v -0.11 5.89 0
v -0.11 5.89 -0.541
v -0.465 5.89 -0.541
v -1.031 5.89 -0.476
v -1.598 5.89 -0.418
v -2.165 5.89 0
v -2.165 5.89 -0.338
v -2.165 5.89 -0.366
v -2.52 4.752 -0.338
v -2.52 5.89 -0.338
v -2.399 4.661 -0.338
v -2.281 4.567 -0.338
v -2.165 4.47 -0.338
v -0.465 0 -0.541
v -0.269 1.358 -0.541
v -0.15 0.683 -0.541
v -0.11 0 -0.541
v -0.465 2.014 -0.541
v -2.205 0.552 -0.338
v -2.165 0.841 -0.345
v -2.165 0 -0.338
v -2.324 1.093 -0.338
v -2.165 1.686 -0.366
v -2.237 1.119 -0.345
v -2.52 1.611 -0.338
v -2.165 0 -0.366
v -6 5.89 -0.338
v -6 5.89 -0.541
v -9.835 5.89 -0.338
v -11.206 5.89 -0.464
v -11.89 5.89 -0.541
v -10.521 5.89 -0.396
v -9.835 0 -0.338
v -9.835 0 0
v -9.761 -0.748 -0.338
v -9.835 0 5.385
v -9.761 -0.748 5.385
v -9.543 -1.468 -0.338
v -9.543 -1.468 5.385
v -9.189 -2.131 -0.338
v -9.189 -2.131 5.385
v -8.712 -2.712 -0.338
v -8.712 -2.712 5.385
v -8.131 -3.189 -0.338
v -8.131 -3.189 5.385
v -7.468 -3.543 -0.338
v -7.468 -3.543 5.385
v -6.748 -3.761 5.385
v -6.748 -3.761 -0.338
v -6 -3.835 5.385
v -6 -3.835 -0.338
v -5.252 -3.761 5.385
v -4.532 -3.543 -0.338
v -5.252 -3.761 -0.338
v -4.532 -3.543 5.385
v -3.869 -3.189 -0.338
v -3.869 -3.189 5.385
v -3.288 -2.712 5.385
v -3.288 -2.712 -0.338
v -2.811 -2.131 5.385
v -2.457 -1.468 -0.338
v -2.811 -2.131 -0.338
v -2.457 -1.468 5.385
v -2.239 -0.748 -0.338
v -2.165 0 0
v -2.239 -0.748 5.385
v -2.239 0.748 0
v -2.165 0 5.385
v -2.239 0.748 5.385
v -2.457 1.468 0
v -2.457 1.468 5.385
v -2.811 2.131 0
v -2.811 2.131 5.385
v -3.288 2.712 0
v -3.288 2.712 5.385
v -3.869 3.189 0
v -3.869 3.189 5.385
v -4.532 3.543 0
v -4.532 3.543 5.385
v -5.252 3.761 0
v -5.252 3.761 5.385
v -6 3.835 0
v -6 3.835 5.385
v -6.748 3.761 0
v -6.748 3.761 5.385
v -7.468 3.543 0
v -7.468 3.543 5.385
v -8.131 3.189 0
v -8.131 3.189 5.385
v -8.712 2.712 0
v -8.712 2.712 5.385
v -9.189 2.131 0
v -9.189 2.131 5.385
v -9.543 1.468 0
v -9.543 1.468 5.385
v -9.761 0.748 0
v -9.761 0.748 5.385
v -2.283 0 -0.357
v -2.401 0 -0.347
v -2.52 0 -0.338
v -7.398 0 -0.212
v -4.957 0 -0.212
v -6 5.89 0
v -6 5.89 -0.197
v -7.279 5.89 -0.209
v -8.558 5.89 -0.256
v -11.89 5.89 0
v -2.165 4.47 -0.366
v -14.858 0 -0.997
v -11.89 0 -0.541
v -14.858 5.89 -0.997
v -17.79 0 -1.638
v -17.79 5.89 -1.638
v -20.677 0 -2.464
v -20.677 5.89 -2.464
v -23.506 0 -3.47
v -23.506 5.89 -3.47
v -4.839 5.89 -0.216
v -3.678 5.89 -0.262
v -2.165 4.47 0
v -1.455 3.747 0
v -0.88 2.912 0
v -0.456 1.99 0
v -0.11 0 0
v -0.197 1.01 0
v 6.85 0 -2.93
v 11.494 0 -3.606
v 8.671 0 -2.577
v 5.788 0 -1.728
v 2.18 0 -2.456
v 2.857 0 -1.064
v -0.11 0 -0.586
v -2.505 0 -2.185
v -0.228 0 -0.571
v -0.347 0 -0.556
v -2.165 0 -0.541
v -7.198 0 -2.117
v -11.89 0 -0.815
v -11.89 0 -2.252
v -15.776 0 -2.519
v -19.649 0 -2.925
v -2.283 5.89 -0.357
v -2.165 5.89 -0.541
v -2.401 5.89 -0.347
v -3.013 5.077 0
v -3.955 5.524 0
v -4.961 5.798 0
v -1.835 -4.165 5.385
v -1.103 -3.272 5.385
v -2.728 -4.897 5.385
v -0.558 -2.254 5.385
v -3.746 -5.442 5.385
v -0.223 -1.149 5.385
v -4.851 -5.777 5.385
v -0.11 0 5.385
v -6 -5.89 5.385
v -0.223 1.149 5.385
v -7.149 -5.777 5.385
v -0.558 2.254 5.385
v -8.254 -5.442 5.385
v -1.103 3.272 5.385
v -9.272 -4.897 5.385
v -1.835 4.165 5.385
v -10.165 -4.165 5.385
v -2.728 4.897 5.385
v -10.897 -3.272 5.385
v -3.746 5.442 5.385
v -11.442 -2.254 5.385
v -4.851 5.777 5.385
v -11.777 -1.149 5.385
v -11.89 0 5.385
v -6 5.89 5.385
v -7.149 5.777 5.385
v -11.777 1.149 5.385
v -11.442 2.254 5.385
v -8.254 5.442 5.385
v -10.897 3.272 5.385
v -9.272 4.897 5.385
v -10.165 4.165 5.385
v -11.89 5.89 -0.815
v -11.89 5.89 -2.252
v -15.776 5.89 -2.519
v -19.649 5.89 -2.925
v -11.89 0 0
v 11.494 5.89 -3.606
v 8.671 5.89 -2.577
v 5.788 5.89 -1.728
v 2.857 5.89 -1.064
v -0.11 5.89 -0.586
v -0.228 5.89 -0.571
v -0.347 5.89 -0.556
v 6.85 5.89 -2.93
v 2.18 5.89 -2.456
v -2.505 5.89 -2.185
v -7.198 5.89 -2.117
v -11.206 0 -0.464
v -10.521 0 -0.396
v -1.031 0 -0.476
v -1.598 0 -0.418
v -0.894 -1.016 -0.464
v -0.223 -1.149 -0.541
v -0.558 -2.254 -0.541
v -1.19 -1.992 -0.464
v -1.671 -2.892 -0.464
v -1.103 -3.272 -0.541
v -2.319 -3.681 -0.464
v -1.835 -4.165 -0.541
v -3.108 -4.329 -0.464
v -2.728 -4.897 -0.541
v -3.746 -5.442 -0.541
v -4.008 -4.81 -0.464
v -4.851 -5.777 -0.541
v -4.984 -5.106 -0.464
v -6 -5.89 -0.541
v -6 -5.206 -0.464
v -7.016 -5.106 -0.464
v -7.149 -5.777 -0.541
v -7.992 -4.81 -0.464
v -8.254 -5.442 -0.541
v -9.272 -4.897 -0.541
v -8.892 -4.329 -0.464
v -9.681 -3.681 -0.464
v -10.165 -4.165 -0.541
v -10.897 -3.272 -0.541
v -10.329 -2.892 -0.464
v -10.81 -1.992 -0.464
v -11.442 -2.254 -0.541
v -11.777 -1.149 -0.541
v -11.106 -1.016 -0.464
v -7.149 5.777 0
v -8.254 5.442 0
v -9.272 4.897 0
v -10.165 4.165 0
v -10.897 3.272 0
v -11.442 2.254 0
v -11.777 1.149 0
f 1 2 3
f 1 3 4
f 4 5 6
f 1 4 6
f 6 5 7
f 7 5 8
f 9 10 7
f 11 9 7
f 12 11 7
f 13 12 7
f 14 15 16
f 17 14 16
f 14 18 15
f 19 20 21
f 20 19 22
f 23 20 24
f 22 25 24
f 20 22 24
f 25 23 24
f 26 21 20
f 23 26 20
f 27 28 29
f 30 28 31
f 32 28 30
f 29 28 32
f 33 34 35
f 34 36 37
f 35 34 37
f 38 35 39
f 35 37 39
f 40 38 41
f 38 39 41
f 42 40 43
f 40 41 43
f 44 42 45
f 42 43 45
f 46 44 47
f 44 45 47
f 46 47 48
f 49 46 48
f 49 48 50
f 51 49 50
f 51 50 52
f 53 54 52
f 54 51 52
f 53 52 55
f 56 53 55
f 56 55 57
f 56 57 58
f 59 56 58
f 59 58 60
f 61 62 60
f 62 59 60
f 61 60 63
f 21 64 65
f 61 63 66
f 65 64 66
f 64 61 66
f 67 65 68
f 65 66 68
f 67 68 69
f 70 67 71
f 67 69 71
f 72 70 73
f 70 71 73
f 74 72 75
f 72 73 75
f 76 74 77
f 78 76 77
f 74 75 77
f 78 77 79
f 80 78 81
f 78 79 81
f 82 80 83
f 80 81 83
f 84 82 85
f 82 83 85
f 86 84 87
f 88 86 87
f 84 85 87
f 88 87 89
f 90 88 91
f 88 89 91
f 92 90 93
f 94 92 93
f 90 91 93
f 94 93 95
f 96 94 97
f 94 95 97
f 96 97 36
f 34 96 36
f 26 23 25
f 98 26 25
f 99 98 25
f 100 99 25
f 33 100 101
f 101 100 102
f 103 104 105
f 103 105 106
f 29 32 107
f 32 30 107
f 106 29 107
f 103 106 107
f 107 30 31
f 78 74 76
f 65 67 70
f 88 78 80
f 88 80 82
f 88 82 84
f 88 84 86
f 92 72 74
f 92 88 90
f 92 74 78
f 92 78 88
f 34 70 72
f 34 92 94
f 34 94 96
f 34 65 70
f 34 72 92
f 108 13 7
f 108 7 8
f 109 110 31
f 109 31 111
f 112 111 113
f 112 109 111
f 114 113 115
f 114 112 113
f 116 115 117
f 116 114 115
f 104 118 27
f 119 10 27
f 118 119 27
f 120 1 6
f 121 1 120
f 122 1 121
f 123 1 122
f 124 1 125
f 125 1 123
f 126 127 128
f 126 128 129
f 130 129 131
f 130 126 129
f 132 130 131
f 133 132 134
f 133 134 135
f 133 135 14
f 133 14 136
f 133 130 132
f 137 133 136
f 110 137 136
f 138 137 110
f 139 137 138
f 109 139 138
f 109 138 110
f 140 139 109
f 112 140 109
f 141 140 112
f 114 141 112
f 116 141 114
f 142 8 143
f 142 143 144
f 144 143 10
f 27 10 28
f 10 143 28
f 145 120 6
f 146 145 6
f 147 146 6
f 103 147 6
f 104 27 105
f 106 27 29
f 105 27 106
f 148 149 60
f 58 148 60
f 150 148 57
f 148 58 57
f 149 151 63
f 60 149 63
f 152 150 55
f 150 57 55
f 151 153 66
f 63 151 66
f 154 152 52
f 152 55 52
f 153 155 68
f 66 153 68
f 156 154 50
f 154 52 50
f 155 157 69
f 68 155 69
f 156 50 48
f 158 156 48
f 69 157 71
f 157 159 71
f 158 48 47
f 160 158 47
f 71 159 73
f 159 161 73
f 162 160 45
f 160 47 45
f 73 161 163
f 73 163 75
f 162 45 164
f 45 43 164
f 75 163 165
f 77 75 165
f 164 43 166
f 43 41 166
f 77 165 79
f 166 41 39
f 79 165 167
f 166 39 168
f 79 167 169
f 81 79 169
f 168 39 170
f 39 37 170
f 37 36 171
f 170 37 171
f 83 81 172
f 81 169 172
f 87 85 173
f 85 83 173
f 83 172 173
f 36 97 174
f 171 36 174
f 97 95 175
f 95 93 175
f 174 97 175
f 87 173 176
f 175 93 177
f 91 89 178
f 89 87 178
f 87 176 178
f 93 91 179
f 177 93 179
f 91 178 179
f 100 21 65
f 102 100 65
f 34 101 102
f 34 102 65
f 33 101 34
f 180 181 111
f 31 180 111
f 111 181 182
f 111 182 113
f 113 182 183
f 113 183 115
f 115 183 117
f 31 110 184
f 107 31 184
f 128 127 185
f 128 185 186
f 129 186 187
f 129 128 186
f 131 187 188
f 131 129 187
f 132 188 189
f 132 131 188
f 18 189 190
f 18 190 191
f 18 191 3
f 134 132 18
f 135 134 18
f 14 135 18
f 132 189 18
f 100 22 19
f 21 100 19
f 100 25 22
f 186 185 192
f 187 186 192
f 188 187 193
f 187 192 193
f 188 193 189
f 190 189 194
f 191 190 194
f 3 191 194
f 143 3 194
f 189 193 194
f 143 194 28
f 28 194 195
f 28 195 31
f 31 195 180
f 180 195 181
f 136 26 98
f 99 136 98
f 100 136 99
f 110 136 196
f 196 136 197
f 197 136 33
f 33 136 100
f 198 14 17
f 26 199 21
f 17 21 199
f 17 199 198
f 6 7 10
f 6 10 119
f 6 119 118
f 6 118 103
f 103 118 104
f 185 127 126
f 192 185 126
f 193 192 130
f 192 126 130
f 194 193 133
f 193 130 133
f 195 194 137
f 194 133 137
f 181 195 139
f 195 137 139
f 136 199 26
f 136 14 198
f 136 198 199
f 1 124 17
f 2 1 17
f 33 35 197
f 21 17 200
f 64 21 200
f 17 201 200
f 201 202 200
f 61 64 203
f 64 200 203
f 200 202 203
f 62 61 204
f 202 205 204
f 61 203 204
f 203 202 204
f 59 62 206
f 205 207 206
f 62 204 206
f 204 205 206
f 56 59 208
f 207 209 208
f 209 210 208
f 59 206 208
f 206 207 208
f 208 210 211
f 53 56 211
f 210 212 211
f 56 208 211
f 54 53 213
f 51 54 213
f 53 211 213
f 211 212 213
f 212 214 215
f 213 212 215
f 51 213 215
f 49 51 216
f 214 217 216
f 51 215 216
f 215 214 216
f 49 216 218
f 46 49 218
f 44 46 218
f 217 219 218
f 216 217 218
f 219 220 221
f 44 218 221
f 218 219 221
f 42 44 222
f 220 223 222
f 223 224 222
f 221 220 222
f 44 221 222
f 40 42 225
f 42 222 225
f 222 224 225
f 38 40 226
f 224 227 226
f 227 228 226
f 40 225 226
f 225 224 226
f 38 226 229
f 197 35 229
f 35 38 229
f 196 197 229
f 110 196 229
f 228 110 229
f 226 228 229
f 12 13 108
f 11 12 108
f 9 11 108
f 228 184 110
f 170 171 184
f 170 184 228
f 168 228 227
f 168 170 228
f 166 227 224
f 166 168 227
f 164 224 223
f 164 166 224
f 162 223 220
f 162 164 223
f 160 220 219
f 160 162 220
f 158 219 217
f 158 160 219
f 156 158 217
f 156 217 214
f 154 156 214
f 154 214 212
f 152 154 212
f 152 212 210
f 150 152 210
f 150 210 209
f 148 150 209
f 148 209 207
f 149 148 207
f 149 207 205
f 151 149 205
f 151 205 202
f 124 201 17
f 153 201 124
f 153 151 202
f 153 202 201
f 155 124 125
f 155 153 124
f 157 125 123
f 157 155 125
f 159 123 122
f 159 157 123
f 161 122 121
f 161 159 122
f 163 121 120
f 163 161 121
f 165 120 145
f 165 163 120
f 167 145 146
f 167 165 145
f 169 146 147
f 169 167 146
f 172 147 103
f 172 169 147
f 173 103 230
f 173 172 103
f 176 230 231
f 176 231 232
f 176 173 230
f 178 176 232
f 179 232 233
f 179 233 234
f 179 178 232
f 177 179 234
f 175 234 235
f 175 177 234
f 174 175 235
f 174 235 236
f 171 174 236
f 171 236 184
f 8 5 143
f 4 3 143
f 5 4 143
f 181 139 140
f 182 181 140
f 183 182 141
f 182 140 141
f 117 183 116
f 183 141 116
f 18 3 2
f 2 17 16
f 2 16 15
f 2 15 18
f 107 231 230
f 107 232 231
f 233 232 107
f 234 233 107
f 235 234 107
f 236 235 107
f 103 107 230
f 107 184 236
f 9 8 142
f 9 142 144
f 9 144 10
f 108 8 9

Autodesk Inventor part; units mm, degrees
ref_plane "YZ Plane" through (0, 0, 0) normal (1, 0, 0) x (0, 1, 0)
ref_plane "XZ Plane" through (0, 0, 0) normal (0, 1, 0) x (-1, 0, 0)
ref_plane "РабПлоскость1" through (0, 0, 0) normal (0, 0, 1) x (-1, 0, 0)
sketch "Эскиз1" plane through (0, 0, 0) normal (0, 0, 1) x (-1, 0, 0)
  circle A0 centre (6, 0) radius 3.75 projected
  line L0 (-30.812, 36.839) -> (43.1664, 36.839) projected
  line L1 (-30.812, -13.161) -> (43.1664, -13.161) projected
  circle A1 centre (6, 0) radius 6 projected
  line L2 (-17.8212, -13.161) -> (-17.8212, 36.839) projected
  line L3 (-17.8212, -13.161) -> (30.1756, -13.161) projected
  line L4 (30.1756, 36.839) -> (30.1756, -13.161) projected
  line L5 (-17.8212, 36.839) -> (30.1756, 36.839) projected
  point P0 (0, 0)
ref_plane "РабПлоскость2" through (-6, 0, 7.3222) normal (0, -1, 0) x (-1, 0, 0)
sketch "Эскиз2" plane through (-6, 0, 7.3222) normal (0, -1, 0) x (-1, 0, 0)
  line L0 (-3.75, 7.3222) -> (3.75, 7.3222) projected
  line L1 (0, -317.8644) -> (0, 181.8185)
  line L2 (3.75, 1.937) -> (-3.75, 1.937) construction
  arc A0 (3.75, 4.187) -> (-3.75, 4.187) centre (0, 4.187) ccw construction
  line L3 (3.835, 1.937) -> (-3.835, 1.937)
  line L4 (-3.835, 1.937) -> (-3.835, 8.137)
  line L5 (-3.835, 8.137) -> (3.835, 8.137)
  line L6 (3.835, 8.137) -> (3.835, 1.937)
  line L7 (6, 0) -> (6, 7.2771)
  line L8 (-6, 0) -> (-6, 7.3222)
  line L9 (5.89, 1.937) -> (-5.89, 1.937)
  line L10 (-5.89, 1.937) -> (-5.89, 8.137)
  line L11 (-5.89, 8.137) -> (5.89, 8.137) construction
  line L12 (5.89, 8.137) -> (5.89, 1.937)
  arc A1 (-36.812, 25.2187) -> (37.1664, 25.2187) centre (0.1772, 55.0189) ccw projected
  arc A2 (-17.4945, 10.9285) -> (17.5055, 10.7924) centre (0.4209, 117.7231) ccw
  line L13 (17.5055, 10.7924) -> (-17.4945, 10.9285) construction
  arc A3 (-36.812, 25.2187) -> (37.1664, 25.2187) centre (0.1772, 55.0189) ccw construction
  point P0 (0, 7.937)
  point P1 (0, 1.937)
  point P2 (0, 8.137)
  point P3 (5.89, 7.8636)
  point P4 (3.835, 7.6599)
  point P5 (0, 9.437)
  dimension "d1" = 7.5
  dimension "d2" = 7.67
  dimension "d3" = 0.2
  dimension "d4" = 12
  dimension "d5" = 11.78
  dimension "d8" = 1.3
  dimension "d9" = 35
revolve "Вращение1" add sketch "Эскиз2" angle 360 about axis through (-6, 0, 325.1866) along (0, 0, -1) contours L6 A1 L12 L9
ref_plane "РабПлоскость3" through (-6, 5.89, 2.4219) normal (0, -1, 0) x (-1, 0, 0)
sketch "Эскиз5" plane through (-6, 5.89, 2.4219) normal (0, -1, 0) x (-1, 0, 0)
  line L0 (5.89, 2.9633) -> (-5.89, 2.9633) projected
  point P0 (-6, 2.4219)
  point P1 (0, 2.9633)
sketch "Эскиз3" plane through (-6, 0, 7.3222) normal (0, -1, 0) x (-1, 0, 0)
  arc A0 (-17.4945, 10.9285) -> (17.5055, 10.7924) centre (0.4209, 117.7231) ccw projected
  arc A1 (-36.812, 25.2187) -> (37.1664, 25.2187) centre (0.1772, 55.0189) ccw projected
  line L0 (-5.89, 1.937) -> (-5.89, 8.137) projected
  line L1 (-3.835, 1.937) -> (-3.835, 8.137) projected
  line L2 (-3.835, 8.137) -> (3.835, 8.137) projected
  line L3 (5.89, 8.137) -> (5.89, 1.937) projected
  line L4 (5.89, 8.137) -> (5.89, 9.5744)
  line L5 (3.835, 7.6599) -> (-3.835, 7.6599) projected
  line L6 (5.89, 7.8636) -> (-5.89, 7.8636) projected
  line L7 (5.89, 7.8636) -> (-5.89, 7.8636) projected
  line L8 (-36.812, 7.3222) -> (37.1664, 7.3222) projected
  point P0 (-6, 7.3222)
  point P1 (5.89, 7.8636)
  point P2 (-5.5356, 7.8636)
  point P3 (-5.89, 7.3222)
  point P4 (5.89, 7.3222)
  point P5 (-3.4806, 7.6599)
  point P6 (-3.835, 7.6886)
extrude "Выдавливание1" add sketch "Эскиз3" against normal up to surface (5.89 mm away) contours A0 L4 L3 L6 A1 | A0 A1 L3 L4 | L6 L1 A1 | A1 L1 L8 L0 L6 | L3 L8 L1 L5 A1 | A1 L5 L1 L6 | A1 L5
properties part number "kick_panel"
